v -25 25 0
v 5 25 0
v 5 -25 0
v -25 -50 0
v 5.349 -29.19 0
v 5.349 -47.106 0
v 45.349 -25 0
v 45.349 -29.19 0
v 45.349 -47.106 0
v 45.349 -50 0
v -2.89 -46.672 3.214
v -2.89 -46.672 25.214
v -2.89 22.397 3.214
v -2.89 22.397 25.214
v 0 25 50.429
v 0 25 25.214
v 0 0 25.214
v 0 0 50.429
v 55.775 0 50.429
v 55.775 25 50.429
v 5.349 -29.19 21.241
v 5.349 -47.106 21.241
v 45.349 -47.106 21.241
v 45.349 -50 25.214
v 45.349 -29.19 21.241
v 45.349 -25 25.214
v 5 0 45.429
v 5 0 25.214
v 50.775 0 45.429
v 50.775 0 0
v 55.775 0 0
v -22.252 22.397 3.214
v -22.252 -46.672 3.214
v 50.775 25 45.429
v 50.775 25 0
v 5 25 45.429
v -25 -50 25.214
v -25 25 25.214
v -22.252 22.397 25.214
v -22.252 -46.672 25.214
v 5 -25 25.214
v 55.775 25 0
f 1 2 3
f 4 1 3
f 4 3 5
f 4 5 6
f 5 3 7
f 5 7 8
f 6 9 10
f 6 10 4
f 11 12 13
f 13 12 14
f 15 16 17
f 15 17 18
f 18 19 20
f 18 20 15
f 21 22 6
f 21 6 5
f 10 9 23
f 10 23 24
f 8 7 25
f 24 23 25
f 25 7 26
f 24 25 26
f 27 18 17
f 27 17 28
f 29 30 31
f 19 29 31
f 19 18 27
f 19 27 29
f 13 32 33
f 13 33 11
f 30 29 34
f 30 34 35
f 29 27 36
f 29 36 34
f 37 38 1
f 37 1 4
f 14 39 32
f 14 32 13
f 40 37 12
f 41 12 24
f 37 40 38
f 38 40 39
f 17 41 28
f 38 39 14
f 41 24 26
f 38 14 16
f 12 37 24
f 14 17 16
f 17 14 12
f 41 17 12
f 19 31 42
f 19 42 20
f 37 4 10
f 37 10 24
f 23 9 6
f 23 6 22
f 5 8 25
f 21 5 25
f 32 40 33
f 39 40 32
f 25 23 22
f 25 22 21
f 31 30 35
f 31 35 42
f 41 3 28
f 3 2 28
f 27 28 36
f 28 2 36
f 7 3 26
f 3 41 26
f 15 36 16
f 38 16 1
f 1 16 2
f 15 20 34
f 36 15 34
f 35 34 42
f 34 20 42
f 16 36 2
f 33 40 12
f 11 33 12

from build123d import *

# Parameters (mm, degrees)
F0_W      = 5
F0_H      = 25.21445
F1_DEPTH  = 25
F2_DEPTH  = 25
F3_W      = 40.349028
F3_H      = 25.21445
F3_W_2    = 5
F4_DEPTH  = 25
F6_DEPTH  = 25
F7_W      = 19.362385
F7_H      = 69.068812
F8_DEPTH  = 22
F9_W      = 17.915649
F9_H      = 21.240922
F10_DEPTH = 40


with BuildPart() as f1:
    # F0 (on Front) → F1 (new body)
    with BuildSketch(Plane.XZ):
        Polygon((0, 50.428901), (0, 25.21445), (5, 25.21445), (5, 45.428901), (50.775229, 45.428901), (50.775229, 0), (55.775229, 0), (55.775229, 50.428901), align=None)
        with Locations((2.5, 12.607225)):
            Rectangle(F0_W, F0_H)
    extrude(amount=-F1_DEPTH)

    # F0 (on Front) → F2 (join)
    with BuildSketch(Plane.XZ):
        with Locations((2.5, 12.607225)):
            Rectangle(F0_W, F0_H)
    extrude(amount=F2_DEPTH)

    # F3 (on face) → F4 (join)
    with BuildSketch(Plane.XZ.offset(25)):
        with Locations((25.174514, 12.607225)):
            Rectangle(F3_W, F3_H)
        with Locations((2.5, 12.607225)):
            Rectangle(F3_W_2, F3_H)
    extrude(amount=F4_DEPTH)

    # F5 (on face) → F6 (join)
    with BuildSketch(Plane(origin=(0, 0, 0), x_dir=(0, -1, 0), z_dir=(-1, 0, 0))):
        Polygon((-25, 25.21445), (-25, 0), (50, 0), (50, 25.21445), (0, 25.21445), align=None)
    extrude(amount=F6_DEPTH)

    # F7 (on face) → F8 (cut)
    with BuildSketch(Plane.XY.offset(25.21445)):
        with Locations((-12.571103, -12.137614)):
            Rectangle(F7_W, F7_H)
    extrude(amount=-F8_DEPTH, mode=Mode.SUBTRACT)

    # F9 (on face) → F10 (cut)
    with BuildSketch(Plane.YZ.offset(45.349028)):
        with Locations((-38.147681, 10.620461)):
            Rectangle(F9_W, F9_H)
    extrude(amount=-F10_DEPTH, mode=Mode.SUBTRACT)


solid = f1.part
